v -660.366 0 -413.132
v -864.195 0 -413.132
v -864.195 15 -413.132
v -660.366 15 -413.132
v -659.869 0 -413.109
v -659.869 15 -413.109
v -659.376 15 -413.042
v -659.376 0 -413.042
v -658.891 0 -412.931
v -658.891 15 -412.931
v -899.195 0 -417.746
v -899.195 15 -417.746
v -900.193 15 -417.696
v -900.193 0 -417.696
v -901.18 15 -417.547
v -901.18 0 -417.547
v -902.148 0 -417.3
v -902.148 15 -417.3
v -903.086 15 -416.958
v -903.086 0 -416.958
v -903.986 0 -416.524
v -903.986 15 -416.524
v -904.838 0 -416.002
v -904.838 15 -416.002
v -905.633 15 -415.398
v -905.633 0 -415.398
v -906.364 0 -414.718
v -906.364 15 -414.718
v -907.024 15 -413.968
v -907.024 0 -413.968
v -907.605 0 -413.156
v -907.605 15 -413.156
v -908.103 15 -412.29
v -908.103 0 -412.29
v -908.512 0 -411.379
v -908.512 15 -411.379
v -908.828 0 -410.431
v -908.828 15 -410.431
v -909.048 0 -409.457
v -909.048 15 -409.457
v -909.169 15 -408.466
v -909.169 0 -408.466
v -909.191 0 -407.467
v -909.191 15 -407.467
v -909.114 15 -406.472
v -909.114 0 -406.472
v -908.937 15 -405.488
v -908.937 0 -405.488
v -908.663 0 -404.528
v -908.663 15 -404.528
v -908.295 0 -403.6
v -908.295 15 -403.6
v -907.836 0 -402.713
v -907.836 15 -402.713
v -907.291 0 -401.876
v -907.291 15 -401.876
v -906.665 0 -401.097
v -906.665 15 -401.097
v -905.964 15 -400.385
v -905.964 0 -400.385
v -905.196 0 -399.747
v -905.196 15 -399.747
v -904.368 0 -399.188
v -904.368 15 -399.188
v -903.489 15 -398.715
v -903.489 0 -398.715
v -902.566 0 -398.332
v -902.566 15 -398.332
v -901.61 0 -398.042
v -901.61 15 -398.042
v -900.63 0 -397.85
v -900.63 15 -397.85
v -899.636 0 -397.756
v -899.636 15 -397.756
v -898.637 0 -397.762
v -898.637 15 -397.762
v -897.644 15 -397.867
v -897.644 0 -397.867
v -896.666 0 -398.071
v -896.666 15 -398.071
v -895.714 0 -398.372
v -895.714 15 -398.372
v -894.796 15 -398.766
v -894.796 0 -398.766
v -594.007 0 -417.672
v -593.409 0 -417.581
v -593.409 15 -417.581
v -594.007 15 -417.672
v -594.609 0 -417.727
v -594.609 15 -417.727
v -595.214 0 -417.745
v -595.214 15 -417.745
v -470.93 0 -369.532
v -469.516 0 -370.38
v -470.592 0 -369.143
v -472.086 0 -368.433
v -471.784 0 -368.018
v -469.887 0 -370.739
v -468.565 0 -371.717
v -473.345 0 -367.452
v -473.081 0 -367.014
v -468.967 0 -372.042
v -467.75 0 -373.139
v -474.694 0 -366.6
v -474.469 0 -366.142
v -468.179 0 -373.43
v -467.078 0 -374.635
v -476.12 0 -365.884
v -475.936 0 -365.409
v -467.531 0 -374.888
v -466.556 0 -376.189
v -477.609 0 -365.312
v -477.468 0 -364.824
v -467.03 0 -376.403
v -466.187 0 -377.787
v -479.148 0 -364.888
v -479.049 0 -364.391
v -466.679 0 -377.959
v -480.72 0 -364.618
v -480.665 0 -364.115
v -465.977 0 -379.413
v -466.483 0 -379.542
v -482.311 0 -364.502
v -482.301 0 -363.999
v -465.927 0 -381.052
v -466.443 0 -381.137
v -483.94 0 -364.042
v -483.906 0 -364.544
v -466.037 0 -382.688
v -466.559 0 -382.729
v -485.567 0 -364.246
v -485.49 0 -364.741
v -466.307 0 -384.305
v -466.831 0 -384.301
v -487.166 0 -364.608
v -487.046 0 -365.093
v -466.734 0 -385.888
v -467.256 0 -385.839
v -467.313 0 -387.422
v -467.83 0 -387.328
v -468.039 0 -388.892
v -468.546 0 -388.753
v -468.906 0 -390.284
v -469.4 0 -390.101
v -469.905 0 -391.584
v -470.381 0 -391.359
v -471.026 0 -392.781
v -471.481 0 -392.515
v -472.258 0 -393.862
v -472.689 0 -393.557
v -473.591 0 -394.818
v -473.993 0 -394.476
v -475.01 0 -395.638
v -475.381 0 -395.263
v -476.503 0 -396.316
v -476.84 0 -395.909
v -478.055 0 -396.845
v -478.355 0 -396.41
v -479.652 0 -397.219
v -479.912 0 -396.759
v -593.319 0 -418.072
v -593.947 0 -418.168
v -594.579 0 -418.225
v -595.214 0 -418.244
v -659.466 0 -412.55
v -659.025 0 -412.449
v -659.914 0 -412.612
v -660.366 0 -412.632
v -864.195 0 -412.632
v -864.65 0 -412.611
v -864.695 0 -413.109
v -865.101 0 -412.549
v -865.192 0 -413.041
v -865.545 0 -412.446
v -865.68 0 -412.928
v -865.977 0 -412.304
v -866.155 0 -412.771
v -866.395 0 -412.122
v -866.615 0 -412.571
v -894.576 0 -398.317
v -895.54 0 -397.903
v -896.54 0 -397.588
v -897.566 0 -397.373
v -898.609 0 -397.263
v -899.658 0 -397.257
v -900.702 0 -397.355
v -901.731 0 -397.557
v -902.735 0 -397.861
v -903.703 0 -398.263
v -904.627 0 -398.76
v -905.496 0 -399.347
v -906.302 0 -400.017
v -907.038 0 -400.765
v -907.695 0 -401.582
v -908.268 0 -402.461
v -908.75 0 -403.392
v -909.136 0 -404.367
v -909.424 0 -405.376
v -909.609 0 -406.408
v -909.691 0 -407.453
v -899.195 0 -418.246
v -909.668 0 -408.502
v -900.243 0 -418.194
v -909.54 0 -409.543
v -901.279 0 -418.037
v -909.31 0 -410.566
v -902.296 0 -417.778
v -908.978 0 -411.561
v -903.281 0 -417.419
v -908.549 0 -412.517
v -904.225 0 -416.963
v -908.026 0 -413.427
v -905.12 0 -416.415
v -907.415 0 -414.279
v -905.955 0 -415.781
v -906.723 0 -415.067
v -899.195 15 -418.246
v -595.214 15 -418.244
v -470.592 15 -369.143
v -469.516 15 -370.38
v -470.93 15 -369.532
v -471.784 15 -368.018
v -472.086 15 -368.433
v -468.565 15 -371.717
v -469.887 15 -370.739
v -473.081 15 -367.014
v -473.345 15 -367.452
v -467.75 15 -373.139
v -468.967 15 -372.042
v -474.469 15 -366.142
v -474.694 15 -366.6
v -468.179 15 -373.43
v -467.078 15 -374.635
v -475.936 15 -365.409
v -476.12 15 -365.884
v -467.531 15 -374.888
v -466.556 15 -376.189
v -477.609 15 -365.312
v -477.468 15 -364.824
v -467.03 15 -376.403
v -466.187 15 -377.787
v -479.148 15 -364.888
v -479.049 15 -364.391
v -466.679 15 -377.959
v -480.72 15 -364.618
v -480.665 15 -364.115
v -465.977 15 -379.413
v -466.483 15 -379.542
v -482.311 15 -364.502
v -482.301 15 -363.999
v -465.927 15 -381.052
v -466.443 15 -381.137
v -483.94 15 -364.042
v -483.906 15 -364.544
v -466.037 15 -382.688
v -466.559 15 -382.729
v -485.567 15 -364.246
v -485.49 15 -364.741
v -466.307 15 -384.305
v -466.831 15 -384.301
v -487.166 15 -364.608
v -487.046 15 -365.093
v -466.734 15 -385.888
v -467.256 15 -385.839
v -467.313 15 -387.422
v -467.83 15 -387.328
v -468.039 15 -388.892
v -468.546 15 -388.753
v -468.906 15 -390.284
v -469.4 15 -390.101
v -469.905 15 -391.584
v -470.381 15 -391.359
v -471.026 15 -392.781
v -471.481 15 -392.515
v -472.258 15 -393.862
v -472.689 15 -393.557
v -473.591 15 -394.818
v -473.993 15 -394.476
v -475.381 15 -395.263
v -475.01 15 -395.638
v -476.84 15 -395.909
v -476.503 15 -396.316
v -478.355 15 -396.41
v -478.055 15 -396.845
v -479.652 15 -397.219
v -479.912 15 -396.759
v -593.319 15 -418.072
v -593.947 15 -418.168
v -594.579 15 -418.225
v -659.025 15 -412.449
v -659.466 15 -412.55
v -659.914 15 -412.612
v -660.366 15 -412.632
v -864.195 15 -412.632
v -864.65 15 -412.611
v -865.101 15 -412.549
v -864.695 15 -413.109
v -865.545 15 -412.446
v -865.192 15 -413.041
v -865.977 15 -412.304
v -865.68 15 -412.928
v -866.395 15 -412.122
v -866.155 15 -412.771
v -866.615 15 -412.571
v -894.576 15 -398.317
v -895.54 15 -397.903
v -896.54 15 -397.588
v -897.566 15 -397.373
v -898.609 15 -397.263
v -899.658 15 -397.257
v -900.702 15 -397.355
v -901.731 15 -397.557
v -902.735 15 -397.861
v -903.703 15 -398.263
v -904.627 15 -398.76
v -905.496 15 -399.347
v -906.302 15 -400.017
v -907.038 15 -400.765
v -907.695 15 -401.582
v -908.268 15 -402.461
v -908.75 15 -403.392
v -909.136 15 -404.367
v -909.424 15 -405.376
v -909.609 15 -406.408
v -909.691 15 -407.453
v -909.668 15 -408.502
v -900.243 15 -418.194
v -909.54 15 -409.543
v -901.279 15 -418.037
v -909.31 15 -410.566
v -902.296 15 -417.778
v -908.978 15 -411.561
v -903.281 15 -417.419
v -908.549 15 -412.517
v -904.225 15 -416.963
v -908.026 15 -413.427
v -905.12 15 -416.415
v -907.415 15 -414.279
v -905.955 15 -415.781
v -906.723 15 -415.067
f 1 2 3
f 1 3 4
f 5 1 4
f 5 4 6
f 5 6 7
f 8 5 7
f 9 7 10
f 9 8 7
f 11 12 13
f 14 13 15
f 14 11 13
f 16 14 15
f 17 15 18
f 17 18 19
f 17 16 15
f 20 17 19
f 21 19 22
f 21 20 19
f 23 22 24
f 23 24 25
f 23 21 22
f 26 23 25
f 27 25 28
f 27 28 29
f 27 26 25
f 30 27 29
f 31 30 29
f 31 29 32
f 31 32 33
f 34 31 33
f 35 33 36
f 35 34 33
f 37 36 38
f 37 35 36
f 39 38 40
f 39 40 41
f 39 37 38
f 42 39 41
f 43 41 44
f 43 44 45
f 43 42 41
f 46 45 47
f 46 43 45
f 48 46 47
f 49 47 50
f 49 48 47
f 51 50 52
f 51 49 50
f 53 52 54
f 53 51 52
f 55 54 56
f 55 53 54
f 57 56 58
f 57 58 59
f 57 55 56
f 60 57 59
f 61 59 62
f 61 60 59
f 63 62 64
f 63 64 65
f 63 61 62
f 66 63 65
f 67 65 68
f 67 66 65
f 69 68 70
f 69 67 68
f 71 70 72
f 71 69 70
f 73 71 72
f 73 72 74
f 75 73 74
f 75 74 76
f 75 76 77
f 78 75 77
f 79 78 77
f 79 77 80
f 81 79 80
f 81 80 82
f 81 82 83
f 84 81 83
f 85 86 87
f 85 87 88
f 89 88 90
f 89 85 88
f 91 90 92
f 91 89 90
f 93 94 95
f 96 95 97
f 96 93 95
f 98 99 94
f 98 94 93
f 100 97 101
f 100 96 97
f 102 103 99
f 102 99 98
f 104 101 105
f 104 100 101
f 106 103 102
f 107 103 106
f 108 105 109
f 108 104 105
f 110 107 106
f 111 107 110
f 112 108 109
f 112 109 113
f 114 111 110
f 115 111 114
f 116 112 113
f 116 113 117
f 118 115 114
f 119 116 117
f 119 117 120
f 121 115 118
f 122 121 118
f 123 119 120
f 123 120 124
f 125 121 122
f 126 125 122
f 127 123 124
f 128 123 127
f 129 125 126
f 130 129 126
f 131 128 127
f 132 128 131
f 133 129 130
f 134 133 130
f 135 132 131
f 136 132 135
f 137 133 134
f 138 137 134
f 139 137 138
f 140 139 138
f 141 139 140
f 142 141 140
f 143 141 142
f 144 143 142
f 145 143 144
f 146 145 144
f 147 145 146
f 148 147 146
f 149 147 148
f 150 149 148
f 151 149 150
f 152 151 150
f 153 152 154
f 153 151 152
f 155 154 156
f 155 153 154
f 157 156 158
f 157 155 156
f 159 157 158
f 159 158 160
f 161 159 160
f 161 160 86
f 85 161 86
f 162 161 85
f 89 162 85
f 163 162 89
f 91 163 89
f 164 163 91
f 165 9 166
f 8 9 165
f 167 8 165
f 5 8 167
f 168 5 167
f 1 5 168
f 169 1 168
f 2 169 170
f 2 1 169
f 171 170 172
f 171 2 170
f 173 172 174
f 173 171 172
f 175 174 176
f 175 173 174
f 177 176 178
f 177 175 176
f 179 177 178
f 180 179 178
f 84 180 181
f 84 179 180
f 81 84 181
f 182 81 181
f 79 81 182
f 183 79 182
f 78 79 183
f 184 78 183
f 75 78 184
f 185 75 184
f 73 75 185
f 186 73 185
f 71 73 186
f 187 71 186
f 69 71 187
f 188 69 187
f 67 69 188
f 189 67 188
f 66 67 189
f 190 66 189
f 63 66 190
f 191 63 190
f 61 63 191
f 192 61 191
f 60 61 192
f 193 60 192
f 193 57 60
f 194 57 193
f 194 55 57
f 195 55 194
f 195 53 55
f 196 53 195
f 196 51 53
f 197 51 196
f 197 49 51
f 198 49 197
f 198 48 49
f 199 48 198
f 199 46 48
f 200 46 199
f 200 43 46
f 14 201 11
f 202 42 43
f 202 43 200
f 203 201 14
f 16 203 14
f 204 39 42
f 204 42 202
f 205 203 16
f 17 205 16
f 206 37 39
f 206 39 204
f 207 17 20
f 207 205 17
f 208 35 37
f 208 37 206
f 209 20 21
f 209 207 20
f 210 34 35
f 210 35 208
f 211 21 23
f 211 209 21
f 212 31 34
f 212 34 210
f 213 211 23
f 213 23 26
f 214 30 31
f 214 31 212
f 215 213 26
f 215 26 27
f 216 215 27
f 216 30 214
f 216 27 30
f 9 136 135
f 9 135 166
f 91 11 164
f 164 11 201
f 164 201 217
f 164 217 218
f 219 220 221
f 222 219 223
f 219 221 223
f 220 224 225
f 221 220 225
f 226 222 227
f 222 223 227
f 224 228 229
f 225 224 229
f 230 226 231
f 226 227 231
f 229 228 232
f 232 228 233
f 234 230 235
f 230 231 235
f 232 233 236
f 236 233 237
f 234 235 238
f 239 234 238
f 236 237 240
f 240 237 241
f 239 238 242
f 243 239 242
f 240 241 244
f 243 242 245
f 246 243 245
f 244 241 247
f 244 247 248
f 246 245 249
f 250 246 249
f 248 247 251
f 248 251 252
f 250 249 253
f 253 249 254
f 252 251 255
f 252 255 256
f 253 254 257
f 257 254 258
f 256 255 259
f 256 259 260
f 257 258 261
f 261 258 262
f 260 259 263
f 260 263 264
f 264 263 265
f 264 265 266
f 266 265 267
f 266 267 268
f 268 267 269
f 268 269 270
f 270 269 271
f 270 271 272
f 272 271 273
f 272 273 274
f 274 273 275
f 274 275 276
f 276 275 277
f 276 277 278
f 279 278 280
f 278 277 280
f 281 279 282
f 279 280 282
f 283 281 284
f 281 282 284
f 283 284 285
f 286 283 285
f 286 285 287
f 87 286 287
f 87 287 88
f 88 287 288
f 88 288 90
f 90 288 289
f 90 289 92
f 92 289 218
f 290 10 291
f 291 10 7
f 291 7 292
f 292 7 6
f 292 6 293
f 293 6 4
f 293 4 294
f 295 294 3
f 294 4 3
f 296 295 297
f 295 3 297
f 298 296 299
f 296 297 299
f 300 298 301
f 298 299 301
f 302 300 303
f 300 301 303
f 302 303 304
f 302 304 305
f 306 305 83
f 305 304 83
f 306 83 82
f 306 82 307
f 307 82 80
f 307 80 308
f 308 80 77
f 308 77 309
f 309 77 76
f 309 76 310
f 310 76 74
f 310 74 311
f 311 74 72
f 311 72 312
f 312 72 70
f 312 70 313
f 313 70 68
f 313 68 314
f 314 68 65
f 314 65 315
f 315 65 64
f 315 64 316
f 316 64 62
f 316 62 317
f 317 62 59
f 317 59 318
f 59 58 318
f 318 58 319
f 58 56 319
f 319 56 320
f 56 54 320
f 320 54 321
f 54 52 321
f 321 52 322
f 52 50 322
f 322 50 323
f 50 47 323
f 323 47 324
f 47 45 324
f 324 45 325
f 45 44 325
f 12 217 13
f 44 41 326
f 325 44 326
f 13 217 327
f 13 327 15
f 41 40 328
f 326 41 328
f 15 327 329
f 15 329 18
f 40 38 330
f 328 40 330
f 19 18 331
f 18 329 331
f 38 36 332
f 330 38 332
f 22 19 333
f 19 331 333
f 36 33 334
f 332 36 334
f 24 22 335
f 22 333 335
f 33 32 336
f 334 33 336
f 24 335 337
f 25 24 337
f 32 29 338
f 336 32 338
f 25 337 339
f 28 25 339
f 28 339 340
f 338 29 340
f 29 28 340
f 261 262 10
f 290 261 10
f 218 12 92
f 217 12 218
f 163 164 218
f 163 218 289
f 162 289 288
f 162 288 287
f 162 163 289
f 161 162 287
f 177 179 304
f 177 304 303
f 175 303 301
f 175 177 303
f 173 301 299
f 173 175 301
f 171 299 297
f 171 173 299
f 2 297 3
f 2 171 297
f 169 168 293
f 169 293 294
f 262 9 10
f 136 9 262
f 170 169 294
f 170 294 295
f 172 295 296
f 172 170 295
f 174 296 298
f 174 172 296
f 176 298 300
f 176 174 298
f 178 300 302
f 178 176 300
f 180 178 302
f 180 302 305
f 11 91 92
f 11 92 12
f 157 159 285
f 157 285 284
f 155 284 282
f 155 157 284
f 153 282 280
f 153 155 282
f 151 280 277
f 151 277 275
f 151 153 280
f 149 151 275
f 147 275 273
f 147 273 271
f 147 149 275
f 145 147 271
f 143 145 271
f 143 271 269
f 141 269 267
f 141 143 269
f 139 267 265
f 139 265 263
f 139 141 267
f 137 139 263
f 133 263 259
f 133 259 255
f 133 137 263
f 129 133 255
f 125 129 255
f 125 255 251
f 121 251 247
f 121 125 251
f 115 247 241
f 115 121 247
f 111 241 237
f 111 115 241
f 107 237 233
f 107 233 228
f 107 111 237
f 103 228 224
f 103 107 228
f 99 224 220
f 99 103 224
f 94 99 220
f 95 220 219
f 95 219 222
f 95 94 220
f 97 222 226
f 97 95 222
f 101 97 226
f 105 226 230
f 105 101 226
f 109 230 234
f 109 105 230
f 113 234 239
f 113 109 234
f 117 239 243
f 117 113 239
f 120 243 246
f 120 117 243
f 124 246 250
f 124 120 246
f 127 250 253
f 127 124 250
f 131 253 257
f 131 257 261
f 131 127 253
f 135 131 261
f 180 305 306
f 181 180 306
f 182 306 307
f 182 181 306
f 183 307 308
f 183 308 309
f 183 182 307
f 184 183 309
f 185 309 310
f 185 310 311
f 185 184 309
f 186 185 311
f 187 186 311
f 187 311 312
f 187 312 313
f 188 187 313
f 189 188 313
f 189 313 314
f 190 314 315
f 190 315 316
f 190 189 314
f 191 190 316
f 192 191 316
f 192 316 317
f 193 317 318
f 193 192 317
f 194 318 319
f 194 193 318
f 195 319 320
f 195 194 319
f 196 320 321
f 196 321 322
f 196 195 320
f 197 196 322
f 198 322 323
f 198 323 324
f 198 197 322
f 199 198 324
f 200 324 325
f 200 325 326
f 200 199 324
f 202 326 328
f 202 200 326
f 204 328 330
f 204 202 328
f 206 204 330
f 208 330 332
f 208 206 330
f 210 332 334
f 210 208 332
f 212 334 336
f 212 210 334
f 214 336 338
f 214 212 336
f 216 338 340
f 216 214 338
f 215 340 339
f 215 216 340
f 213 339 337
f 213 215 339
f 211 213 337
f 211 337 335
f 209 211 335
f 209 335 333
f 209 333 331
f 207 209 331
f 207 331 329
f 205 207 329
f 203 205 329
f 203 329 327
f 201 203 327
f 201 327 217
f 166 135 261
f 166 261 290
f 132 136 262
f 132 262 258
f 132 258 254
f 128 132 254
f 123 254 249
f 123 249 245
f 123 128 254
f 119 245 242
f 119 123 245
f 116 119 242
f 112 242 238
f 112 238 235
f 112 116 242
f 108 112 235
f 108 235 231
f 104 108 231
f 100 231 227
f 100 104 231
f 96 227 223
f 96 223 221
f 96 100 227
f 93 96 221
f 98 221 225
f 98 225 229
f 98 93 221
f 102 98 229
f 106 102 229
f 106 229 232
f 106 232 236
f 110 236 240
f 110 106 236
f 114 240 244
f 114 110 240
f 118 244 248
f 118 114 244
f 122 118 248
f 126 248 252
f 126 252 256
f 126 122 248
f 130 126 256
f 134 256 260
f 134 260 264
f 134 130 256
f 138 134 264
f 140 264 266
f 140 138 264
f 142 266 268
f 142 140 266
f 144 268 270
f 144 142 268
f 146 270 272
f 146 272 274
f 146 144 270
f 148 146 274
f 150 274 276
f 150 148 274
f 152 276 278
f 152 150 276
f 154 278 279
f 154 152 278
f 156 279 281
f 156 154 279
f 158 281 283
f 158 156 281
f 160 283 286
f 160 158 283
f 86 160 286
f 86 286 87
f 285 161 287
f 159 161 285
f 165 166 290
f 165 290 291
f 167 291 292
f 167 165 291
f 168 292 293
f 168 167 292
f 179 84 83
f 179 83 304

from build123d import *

# Parameters (mm, degrees)
BOSS_EXTRUDE1_DEPTH = 15


with BuildPart() as part:
    # Sketch1 → Boss-Extrude1 (new body)
    with BuildSketch(Plane(origin=(0, 0, 0), x_dir=(1, 0, 0), z_dir=(0, 1, 0))):
        with BuildLine():
            ThreePointArc((-659.025122037, 412.448905192), (-659.689338477, 412.586057046), (-660.366005428, 412.632056457))
            Line((-660.366005428, 412.632056457), (-864.195118688, 412.632056457))
            ThreePointArc((-864.195118688, 412.632056457), (-865.324084301, 412.502932831), (-866.39473946, 412.122231116))
            Line((-866.39473946, 412.122231116), (-894.575915261, 398.316999834))
            ThreePointArc((-894.575915261, 398.316999834), (-909.423967253, 405.375573292), (-899.195089964, 418.246366617))
            Line((-899.195089964, 418.246366617), (-595.213920413, 418.24431837))
            ThreePointArc((-595.213920413, 418.24431837), (-594.262691586, 418.201142157), (-593.319285704, 418.071968602))
            Line((-593.319285704, 418.071968602), (-479.651763212, 397.219361415))
            ThreePointArc((-479.651763212, 397.219361415), (-466.351873551, 376.983335948), (-487.166106805, 364.607897137))
            Line((-487.166106805, 364.607897137), (-659.025122037, 412.448905192))
        make_face()
        with BuildLine():
            Line((-658.891051676, 412.930525483), (-487.045817139, 365.093353609))
            ThreePointArc((-487.045817139, 365.093353609), (-466.835293219, 377.176572267), (-479.911630321, 396.759188493))
            Line((-479.911630321, 396.759188493), (-593.409278239, 417.581166717))
            ThreePointArc((-593.409278239, 417.581166717), (-594.307856674, 417.704206285), (-595.213886711, 417.745334257))
            Line((-595.213886711, 417.745334257), (-899.19505992, 417.746358527))
            ThreePointArc((-899.19505992, 417.746358527), (-908.936889556, 405.488468327), (-894.795900883, 398.766001802))
            Line((-894.795900883, 398.766001802), (-866.61470183, 412.571185618))
            ThreePointArc((-866.61470183, 412.571185618), (-865.436984962, 412.989954476), (-864.195127301, 413.131989419))
            Line((-864.195127301, 413.131989419), (-660.366014041, 413.131989419))
            ThreePointArc((-660.366014041, 413.131989419), (-659.621685121, 413.081391266), (-658.891051676, 412.930525483))
        make_face(mode=Mode.SUBTRACT)
    extrude(amount=BOSS_EXTRUDE1_DEPTH)


solid = part.part
